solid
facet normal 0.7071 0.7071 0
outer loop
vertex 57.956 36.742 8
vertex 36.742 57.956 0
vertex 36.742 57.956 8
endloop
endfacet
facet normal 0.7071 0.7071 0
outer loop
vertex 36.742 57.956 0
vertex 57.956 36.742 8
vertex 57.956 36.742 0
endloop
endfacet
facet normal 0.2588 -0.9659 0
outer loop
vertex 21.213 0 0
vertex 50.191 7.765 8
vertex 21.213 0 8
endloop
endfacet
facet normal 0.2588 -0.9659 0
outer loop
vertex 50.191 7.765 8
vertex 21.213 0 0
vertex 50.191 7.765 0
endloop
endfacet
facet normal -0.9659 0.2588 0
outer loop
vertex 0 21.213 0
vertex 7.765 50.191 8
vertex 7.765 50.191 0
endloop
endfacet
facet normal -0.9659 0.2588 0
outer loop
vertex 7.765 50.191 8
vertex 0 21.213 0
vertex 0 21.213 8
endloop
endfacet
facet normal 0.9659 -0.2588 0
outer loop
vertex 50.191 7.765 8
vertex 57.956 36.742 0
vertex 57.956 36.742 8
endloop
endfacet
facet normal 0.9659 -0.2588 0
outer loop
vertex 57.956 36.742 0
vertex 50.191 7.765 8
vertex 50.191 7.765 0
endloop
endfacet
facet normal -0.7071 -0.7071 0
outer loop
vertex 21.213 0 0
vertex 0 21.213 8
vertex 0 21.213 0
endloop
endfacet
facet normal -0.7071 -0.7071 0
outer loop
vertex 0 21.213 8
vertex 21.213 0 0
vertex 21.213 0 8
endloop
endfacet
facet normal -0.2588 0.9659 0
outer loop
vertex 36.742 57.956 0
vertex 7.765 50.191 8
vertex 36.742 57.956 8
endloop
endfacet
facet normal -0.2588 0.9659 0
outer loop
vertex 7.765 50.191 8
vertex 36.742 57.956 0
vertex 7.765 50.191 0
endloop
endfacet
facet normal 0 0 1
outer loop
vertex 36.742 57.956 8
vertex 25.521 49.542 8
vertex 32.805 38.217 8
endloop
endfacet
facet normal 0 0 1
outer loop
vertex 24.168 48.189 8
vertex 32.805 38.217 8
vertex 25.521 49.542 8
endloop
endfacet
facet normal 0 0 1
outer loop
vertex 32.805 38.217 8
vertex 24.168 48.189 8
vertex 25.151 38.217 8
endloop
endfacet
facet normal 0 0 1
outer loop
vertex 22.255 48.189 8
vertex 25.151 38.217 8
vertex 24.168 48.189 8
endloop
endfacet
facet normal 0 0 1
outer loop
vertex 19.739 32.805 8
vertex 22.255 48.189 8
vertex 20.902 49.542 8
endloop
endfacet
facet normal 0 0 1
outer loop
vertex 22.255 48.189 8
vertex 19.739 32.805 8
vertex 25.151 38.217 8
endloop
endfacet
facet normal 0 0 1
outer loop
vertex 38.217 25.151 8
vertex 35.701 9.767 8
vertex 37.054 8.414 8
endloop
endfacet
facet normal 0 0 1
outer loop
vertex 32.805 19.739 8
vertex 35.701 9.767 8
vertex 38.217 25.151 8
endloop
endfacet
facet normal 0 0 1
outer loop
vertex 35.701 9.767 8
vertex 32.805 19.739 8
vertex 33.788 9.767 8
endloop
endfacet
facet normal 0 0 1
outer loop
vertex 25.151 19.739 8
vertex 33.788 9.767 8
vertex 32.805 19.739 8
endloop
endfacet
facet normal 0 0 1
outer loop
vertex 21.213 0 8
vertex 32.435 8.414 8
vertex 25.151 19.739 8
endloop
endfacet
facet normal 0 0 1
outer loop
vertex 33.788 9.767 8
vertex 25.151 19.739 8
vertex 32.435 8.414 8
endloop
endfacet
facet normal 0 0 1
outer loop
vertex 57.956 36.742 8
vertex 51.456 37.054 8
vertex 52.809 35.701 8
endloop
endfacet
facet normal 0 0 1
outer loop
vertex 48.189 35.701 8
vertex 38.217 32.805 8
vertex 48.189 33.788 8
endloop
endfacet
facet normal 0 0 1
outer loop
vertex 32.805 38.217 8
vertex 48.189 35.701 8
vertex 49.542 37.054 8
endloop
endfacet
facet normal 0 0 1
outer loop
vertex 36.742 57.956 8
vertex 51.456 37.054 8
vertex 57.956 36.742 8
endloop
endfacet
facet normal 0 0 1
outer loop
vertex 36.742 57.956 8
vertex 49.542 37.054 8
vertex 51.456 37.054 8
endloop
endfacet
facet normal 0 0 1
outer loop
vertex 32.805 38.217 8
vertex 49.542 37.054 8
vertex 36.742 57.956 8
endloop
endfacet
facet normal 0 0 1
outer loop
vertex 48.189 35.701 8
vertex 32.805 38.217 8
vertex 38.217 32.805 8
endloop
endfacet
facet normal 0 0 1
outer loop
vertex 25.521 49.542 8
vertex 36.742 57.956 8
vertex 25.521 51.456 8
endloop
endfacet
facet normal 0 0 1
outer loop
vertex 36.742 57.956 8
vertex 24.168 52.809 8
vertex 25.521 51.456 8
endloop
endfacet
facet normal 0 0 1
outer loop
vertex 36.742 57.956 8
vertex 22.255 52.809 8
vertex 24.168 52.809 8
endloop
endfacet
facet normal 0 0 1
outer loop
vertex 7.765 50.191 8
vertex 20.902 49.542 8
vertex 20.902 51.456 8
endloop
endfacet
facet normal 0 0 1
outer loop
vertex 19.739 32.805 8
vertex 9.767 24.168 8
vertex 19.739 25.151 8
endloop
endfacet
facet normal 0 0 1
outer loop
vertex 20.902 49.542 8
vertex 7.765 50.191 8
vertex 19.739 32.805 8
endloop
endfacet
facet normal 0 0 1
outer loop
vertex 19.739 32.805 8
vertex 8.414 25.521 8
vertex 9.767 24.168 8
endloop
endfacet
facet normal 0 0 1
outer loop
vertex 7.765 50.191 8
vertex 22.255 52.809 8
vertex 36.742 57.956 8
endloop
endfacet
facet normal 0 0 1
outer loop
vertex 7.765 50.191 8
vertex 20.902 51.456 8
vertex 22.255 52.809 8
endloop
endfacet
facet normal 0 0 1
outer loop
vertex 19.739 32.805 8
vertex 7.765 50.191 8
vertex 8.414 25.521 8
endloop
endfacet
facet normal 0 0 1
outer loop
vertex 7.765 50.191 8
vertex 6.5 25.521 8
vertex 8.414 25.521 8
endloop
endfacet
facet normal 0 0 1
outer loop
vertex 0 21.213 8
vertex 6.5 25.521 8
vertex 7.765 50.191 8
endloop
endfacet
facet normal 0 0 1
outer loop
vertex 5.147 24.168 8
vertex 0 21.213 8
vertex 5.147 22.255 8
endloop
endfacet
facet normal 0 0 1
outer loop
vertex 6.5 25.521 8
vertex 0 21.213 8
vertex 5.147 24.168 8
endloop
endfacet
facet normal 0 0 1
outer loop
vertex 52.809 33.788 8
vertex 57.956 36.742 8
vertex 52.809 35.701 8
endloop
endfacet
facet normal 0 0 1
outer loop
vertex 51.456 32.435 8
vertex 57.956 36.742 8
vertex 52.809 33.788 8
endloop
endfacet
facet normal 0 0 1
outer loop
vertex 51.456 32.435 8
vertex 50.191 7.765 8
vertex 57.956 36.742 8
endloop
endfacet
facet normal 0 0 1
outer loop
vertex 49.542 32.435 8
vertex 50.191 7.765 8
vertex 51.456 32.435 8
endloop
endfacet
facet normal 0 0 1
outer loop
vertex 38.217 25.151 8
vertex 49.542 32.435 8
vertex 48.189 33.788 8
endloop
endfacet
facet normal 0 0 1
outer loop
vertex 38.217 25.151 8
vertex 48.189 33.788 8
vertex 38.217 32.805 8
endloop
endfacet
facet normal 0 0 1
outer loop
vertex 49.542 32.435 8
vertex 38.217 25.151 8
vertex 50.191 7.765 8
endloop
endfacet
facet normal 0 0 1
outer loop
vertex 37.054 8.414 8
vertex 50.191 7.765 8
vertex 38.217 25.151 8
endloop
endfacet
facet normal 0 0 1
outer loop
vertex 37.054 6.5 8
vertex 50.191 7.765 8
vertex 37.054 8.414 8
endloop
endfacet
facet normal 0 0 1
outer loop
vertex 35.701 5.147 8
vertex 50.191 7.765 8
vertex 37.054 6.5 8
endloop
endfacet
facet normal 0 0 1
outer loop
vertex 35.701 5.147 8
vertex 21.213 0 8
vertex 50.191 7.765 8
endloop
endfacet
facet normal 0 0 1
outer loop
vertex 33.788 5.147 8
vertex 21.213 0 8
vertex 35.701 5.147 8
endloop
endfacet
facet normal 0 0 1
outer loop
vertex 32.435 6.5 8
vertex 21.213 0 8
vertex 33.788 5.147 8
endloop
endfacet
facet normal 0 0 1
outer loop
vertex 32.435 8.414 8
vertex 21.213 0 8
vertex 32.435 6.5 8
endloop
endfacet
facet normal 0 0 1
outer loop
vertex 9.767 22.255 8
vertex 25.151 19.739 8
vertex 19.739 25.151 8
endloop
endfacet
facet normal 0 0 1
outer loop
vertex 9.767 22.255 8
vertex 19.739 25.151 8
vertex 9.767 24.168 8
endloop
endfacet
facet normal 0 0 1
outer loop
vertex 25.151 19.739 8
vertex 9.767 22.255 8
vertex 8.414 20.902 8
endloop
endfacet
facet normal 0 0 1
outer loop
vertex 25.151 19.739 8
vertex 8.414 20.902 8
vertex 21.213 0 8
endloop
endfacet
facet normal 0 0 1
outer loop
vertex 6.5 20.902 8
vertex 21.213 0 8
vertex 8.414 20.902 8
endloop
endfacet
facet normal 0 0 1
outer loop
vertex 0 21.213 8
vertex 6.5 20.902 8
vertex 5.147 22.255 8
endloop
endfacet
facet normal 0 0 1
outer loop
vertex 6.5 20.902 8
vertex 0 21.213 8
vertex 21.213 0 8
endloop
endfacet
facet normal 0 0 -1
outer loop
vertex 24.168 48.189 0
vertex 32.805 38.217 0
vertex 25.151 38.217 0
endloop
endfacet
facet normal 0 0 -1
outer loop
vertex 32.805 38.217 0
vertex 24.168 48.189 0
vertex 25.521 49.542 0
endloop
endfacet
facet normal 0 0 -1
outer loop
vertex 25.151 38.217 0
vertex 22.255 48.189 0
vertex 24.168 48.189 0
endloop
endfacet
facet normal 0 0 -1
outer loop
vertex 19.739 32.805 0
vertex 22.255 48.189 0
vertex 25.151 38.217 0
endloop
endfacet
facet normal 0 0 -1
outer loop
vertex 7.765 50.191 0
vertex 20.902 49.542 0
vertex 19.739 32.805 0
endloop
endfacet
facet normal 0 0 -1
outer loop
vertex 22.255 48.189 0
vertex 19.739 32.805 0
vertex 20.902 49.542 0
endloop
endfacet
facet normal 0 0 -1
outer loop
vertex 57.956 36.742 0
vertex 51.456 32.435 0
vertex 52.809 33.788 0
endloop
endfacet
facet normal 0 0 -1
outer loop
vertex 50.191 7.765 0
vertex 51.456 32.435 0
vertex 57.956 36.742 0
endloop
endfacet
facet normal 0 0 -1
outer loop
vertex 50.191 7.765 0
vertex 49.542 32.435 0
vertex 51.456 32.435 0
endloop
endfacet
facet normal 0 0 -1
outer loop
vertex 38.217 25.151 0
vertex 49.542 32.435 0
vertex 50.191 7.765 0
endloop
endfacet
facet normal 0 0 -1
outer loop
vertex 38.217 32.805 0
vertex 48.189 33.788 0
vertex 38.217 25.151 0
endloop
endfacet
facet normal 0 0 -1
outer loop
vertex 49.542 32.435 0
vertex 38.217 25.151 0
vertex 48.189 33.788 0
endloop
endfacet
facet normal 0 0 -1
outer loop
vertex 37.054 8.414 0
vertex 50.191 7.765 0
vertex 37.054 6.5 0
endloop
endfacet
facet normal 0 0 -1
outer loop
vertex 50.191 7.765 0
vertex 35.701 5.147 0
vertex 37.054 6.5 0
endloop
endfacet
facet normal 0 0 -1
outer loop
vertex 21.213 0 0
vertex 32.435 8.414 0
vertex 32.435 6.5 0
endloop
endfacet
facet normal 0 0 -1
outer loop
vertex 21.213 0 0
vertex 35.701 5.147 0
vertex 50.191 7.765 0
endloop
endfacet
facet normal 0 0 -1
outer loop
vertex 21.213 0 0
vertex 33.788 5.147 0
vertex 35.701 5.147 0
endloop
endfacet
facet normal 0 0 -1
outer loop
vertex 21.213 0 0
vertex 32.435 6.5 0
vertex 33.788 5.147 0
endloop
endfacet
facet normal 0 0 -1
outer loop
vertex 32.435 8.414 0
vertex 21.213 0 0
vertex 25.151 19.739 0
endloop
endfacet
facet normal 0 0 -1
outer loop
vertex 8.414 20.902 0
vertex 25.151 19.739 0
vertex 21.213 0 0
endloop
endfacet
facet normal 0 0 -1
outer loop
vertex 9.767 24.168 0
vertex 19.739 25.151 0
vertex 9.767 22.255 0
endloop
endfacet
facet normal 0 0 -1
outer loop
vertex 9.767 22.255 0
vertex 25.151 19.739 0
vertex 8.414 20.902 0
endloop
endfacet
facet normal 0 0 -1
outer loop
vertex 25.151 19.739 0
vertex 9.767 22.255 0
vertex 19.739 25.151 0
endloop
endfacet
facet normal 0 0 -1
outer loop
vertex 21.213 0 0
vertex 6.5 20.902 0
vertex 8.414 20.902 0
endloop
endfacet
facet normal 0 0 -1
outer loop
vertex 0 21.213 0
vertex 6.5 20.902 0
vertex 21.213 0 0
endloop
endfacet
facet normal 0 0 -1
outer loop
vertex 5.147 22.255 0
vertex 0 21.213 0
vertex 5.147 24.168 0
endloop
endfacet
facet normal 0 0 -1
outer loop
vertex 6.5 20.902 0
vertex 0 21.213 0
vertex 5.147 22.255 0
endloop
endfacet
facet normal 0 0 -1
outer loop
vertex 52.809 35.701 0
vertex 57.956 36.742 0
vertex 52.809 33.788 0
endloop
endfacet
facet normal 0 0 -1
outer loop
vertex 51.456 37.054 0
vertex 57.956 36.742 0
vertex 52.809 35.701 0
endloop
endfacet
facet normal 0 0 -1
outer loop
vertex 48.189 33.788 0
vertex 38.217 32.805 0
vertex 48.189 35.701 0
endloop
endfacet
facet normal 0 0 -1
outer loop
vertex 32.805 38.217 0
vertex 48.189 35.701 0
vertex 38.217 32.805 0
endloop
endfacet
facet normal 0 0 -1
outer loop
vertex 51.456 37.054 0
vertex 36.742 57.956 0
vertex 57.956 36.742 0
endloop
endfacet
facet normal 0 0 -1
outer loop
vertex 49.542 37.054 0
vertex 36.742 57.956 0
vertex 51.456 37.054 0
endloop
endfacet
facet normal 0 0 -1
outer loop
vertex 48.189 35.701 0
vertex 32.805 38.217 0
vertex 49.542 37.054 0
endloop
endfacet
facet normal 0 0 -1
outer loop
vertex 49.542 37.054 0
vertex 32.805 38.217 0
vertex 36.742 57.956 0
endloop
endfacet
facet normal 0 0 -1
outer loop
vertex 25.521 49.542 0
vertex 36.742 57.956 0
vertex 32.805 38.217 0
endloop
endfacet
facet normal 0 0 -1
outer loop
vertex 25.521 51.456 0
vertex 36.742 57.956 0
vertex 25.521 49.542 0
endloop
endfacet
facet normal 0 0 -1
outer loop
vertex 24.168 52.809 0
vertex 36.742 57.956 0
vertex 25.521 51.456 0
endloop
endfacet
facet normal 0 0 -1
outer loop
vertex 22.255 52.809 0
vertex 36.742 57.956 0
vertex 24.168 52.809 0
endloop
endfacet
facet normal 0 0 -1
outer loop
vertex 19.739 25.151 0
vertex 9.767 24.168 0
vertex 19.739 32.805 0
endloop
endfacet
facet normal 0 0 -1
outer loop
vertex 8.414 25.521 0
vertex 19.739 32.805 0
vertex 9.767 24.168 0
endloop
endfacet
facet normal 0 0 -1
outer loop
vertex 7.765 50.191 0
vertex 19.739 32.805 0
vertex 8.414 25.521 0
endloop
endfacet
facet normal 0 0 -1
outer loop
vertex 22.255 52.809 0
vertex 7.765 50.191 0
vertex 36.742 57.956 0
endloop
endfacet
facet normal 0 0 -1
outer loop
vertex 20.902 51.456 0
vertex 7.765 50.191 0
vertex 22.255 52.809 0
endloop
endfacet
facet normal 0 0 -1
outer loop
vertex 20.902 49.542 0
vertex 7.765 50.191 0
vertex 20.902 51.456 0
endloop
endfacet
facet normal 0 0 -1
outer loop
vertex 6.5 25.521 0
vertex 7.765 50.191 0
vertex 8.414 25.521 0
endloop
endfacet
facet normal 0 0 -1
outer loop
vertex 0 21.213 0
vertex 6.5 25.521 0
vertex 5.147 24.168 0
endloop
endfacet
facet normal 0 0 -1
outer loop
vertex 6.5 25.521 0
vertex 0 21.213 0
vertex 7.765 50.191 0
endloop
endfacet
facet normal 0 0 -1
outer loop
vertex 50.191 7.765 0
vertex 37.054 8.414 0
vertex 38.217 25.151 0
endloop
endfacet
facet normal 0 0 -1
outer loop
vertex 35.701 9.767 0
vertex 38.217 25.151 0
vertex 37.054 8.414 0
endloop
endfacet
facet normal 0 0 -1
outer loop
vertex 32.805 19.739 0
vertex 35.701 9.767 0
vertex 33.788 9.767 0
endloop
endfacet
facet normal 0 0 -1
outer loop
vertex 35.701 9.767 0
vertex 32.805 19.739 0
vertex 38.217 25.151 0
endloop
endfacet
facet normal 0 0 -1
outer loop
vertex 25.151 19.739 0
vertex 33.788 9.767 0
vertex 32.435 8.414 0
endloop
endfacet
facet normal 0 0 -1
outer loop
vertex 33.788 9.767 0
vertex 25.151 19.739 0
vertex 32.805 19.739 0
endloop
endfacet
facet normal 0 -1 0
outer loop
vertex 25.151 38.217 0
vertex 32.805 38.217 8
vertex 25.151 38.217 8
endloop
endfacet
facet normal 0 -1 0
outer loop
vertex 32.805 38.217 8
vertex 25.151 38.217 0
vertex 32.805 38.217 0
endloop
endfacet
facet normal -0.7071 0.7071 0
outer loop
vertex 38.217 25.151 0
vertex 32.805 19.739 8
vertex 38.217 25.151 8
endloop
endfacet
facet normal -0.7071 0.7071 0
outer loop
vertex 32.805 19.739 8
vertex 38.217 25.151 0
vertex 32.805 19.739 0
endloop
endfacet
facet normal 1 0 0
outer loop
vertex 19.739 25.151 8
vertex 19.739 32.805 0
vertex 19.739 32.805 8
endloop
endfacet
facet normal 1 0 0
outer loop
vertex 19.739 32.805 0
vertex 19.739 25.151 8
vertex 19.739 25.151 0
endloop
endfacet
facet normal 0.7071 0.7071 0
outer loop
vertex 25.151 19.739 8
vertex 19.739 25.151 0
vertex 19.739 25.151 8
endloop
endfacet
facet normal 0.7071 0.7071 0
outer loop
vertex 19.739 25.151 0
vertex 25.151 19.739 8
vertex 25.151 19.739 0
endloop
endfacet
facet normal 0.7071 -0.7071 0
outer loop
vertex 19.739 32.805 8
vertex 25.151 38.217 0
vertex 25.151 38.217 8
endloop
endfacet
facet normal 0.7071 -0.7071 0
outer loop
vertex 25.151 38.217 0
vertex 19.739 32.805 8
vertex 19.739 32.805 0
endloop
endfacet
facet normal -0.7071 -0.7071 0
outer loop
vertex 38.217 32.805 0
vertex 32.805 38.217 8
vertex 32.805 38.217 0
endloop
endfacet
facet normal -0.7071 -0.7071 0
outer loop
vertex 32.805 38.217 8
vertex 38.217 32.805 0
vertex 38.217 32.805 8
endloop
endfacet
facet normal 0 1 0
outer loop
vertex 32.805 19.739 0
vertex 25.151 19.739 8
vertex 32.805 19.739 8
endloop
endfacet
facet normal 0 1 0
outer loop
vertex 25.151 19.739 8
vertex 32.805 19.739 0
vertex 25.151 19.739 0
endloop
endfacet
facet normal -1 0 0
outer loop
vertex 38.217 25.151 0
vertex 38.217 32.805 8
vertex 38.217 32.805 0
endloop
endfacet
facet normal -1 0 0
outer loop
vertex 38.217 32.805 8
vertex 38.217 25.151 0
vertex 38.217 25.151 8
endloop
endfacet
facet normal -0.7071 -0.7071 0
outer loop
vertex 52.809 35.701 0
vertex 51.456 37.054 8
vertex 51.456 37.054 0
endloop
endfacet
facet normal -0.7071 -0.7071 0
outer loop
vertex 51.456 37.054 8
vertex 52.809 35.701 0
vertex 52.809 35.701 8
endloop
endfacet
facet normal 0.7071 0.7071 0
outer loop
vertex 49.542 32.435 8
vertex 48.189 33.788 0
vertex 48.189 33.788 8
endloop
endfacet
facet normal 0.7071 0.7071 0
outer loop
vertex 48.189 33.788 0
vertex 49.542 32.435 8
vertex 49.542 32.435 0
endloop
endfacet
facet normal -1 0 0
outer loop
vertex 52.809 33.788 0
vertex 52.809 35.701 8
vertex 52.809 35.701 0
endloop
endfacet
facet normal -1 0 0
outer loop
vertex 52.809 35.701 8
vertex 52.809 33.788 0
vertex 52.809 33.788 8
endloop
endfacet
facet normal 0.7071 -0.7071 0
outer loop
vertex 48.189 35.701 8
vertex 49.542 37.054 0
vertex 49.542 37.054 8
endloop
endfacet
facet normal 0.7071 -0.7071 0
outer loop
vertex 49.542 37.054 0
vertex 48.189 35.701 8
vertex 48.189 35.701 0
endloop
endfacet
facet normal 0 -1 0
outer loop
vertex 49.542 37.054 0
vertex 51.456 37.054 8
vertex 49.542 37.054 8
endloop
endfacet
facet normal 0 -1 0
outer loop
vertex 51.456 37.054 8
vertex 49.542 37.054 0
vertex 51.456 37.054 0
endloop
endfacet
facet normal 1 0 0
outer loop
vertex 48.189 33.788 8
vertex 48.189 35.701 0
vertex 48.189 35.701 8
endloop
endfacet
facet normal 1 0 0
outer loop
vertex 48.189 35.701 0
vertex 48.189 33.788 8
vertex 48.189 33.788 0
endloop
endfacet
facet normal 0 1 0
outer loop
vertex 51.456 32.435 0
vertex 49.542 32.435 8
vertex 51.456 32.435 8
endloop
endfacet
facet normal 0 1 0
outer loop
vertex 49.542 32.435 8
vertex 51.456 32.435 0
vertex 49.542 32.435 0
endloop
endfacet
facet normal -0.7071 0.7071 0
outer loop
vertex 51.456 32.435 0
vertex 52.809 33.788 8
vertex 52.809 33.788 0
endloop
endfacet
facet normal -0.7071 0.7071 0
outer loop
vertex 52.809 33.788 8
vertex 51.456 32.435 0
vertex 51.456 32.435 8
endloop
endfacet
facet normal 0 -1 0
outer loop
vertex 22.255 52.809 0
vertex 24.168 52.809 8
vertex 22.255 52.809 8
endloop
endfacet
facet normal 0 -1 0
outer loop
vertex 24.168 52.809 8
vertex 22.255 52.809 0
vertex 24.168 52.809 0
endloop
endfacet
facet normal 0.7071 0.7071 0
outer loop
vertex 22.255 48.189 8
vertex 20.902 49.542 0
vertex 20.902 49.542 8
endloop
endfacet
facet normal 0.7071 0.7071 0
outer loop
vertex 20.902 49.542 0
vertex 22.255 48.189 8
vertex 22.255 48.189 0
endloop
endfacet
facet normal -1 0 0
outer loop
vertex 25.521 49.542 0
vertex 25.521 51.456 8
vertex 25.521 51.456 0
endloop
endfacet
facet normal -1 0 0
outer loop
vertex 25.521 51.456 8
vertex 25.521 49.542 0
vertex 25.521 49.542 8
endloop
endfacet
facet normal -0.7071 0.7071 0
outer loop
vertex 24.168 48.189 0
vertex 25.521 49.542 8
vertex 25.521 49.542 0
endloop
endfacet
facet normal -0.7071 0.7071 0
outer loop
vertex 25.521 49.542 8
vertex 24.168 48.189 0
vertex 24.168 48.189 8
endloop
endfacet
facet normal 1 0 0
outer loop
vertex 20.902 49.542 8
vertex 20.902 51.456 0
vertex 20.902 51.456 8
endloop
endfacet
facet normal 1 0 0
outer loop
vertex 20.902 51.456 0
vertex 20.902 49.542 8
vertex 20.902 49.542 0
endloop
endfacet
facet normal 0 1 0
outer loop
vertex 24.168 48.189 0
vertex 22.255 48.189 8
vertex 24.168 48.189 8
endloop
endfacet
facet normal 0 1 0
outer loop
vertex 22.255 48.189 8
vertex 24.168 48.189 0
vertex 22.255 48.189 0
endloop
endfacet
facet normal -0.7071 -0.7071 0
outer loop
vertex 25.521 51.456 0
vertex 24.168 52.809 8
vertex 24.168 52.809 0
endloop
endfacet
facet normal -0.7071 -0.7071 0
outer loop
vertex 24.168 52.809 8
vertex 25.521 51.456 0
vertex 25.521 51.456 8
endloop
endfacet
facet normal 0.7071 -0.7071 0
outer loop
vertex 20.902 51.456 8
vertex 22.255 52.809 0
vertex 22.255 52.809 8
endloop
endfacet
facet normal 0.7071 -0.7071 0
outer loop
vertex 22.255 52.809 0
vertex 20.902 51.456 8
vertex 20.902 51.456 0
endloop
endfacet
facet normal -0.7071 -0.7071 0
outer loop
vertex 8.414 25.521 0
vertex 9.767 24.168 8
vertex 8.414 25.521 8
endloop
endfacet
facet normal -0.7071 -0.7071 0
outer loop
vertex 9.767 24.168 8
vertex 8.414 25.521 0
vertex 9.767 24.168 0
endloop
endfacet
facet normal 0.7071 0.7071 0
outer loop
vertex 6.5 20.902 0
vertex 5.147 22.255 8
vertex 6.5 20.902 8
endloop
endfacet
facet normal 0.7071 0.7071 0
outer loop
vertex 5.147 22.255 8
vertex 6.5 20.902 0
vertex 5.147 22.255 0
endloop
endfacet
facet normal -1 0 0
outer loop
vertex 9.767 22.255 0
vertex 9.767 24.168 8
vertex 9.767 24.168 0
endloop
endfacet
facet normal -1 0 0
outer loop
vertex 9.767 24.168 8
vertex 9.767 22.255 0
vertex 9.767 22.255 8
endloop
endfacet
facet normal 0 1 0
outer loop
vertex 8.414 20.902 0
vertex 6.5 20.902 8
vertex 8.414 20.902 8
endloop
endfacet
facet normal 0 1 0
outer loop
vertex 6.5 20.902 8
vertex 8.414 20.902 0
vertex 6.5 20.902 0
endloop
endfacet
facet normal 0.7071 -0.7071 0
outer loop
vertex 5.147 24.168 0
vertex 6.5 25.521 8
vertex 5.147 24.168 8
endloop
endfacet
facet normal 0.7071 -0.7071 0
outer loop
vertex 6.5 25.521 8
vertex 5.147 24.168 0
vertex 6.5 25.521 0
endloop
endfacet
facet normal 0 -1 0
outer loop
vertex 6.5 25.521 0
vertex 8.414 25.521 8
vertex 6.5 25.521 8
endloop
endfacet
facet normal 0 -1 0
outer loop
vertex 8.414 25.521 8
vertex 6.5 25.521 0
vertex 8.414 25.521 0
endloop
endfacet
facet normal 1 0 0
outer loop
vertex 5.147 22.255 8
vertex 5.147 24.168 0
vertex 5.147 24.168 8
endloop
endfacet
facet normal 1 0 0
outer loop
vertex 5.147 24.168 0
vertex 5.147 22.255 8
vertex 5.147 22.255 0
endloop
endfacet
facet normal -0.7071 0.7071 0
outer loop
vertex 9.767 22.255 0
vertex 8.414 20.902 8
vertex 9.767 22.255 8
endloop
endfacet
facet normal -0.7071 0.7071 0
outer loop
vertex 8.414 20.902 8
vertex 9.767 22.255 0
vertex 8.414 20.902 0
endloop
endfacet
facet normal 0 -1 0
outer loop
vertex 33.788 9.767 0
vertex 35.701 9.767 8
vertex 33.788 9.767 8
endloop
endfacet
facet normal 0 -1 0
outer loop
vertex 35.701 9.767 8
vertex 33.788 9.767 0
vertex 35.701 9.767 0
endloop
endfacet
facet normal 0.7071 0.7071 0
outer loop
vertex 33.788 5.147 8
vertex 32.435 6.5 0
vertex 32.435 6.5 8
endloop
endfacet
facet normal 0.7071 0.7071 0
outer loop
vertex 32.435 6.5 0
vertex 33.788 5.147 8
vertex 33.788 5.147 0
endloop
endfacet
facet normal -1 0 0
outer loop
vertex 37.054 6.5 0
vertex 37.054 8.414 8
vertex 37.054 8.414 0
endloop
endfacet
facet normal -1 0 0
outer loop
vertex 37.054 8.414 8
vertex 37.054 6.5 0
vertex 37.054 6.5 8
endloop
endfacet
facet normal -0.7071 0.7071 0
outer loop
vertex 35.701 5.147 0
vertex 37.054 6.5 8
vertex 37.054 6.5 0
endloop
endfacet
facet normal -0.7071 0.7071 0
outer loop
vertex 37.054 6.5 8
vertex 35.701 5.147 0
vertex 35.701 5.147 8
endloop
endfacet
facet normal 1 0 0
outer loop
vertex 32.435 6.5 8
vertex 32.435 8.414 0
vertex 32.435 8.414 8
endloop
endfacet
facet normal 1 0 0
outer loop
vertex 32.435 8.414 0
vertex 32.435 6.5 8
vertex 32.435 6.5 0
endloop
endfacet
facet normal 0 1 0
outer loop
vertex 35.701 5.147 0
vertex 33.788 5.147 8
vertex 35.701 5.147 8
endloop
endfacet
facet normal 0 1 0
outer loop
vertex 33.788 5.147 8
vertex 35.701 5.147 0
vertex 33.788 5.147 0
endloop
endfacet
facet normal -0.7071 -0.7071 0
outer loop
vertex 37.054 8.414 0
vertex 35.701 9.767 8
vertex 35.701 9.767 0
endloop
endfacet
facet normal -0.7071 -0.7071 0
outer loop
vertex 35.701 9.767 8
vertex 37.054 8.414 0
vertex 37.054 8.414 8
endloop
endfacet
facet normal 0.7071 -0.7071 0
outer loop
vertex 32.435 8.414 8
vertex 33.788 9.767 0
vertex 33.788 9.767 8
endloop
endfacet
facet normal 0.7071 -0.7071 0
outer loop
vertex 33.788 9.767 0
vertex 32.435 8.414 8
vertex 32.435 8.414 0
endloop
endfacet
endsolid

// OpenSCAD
$fn = 32;

// ----------------------------------------------------------------------
// Polygon plate: 6-gon R30, 4 bolt windows
// ----------------------------------------------------------------------

// --- parameters (mm) ---
sides = 6;                // number of polygon sides
plate_r = 30;             // circumscribed radius of the polygon
bore_r = 10;              // centre bore radius
bolts = 4;                // number of bolt windows
ring_r = 22.28;           // bolt-circle radius
bolt_r = 2.5;             // bolt window radius
plate_t = 8;              // plate thickness, Z (extrusion height)

plate_d = 2 * plate_r;  // circumscribed diameter
bore_d = 2 * bore_r;  // centre bore diameter
bolt_d = 2 * bolt_r;  // bolt window diameter
ring_d = 2 * ring_r;  // bolt-circle diameter

profile = [[57.956, 36.742], [36.742, 57.956], [7.765, 50.191], [0, 21.213], [21.213, 0], [50.191, 7.765]];  // primary outline, 6 points, counter clockwise
void_1 = [[38.217, 32.805], [32.805, 38.217], [25.151, 38.217], [19.739, 32.805], [19.739, 25.151], [25.151, 19.739], [32.805, 19.739], [38.217, 25.151]];  // centre bore, 8 points
void_2 = [[52.809, 35.701], [51.456, 37.054], [49.542, 37.054], [48.189, 35.701], [48.189, 33.788], [49.542, 32.435], [51.456, 32.435], [52.809, 33.788]];  // bolt window 1, 8 points
void_3 = [[25.521, 51.456], [24.168, 52.809], [22.255, 52.809], [20.902, 51.456], [20.902, 49.542], [22.255, 48.189], [24.168, 48.189], [25.521, 49.542]];  // bolt window 2, 8 points
void_4 = [[9.767, 24.168], [8.414, 25.521], [6.5, 25.521], [5.147, 24.168], [5.147, 22.255], [6.5, 20.902], [8.414, 20.902], [9.767, 22.255]];  // bolt window 3, 8 points
void_5 = [[37.054, 8.414], [35.701, 9.767], [33.788, 9.767], [32.435, 8.414], [32.435, 6.5], [33.788, 5.147], [35.701, 5.147], [37.054, 6.5]];  // bolt window 4, 8 points

// --- the one profile operation ---
difference() {
  linear_extrude(height = plate_t) polygon(points = profile);
  translate([0, 0, -1])
    linear_extrude(height = plate_t + 2) polygon(points = void_1);
  translate([0, 0, -1])
    linear_extrude(height = plate_t + 2) polygon(points = void_2);
  translate([0, 0, -1])
    linear_extrude(height = plate_t + 2) polygon(points = void_3);
  translate([0, 0, -1])
    linear_extrude(height = plate_t + 2) polygon(points = void_4);
  translate([0, 0, -1])
    linear_extrude(height = plate_t + 2) polygon(points = void_5);
}
